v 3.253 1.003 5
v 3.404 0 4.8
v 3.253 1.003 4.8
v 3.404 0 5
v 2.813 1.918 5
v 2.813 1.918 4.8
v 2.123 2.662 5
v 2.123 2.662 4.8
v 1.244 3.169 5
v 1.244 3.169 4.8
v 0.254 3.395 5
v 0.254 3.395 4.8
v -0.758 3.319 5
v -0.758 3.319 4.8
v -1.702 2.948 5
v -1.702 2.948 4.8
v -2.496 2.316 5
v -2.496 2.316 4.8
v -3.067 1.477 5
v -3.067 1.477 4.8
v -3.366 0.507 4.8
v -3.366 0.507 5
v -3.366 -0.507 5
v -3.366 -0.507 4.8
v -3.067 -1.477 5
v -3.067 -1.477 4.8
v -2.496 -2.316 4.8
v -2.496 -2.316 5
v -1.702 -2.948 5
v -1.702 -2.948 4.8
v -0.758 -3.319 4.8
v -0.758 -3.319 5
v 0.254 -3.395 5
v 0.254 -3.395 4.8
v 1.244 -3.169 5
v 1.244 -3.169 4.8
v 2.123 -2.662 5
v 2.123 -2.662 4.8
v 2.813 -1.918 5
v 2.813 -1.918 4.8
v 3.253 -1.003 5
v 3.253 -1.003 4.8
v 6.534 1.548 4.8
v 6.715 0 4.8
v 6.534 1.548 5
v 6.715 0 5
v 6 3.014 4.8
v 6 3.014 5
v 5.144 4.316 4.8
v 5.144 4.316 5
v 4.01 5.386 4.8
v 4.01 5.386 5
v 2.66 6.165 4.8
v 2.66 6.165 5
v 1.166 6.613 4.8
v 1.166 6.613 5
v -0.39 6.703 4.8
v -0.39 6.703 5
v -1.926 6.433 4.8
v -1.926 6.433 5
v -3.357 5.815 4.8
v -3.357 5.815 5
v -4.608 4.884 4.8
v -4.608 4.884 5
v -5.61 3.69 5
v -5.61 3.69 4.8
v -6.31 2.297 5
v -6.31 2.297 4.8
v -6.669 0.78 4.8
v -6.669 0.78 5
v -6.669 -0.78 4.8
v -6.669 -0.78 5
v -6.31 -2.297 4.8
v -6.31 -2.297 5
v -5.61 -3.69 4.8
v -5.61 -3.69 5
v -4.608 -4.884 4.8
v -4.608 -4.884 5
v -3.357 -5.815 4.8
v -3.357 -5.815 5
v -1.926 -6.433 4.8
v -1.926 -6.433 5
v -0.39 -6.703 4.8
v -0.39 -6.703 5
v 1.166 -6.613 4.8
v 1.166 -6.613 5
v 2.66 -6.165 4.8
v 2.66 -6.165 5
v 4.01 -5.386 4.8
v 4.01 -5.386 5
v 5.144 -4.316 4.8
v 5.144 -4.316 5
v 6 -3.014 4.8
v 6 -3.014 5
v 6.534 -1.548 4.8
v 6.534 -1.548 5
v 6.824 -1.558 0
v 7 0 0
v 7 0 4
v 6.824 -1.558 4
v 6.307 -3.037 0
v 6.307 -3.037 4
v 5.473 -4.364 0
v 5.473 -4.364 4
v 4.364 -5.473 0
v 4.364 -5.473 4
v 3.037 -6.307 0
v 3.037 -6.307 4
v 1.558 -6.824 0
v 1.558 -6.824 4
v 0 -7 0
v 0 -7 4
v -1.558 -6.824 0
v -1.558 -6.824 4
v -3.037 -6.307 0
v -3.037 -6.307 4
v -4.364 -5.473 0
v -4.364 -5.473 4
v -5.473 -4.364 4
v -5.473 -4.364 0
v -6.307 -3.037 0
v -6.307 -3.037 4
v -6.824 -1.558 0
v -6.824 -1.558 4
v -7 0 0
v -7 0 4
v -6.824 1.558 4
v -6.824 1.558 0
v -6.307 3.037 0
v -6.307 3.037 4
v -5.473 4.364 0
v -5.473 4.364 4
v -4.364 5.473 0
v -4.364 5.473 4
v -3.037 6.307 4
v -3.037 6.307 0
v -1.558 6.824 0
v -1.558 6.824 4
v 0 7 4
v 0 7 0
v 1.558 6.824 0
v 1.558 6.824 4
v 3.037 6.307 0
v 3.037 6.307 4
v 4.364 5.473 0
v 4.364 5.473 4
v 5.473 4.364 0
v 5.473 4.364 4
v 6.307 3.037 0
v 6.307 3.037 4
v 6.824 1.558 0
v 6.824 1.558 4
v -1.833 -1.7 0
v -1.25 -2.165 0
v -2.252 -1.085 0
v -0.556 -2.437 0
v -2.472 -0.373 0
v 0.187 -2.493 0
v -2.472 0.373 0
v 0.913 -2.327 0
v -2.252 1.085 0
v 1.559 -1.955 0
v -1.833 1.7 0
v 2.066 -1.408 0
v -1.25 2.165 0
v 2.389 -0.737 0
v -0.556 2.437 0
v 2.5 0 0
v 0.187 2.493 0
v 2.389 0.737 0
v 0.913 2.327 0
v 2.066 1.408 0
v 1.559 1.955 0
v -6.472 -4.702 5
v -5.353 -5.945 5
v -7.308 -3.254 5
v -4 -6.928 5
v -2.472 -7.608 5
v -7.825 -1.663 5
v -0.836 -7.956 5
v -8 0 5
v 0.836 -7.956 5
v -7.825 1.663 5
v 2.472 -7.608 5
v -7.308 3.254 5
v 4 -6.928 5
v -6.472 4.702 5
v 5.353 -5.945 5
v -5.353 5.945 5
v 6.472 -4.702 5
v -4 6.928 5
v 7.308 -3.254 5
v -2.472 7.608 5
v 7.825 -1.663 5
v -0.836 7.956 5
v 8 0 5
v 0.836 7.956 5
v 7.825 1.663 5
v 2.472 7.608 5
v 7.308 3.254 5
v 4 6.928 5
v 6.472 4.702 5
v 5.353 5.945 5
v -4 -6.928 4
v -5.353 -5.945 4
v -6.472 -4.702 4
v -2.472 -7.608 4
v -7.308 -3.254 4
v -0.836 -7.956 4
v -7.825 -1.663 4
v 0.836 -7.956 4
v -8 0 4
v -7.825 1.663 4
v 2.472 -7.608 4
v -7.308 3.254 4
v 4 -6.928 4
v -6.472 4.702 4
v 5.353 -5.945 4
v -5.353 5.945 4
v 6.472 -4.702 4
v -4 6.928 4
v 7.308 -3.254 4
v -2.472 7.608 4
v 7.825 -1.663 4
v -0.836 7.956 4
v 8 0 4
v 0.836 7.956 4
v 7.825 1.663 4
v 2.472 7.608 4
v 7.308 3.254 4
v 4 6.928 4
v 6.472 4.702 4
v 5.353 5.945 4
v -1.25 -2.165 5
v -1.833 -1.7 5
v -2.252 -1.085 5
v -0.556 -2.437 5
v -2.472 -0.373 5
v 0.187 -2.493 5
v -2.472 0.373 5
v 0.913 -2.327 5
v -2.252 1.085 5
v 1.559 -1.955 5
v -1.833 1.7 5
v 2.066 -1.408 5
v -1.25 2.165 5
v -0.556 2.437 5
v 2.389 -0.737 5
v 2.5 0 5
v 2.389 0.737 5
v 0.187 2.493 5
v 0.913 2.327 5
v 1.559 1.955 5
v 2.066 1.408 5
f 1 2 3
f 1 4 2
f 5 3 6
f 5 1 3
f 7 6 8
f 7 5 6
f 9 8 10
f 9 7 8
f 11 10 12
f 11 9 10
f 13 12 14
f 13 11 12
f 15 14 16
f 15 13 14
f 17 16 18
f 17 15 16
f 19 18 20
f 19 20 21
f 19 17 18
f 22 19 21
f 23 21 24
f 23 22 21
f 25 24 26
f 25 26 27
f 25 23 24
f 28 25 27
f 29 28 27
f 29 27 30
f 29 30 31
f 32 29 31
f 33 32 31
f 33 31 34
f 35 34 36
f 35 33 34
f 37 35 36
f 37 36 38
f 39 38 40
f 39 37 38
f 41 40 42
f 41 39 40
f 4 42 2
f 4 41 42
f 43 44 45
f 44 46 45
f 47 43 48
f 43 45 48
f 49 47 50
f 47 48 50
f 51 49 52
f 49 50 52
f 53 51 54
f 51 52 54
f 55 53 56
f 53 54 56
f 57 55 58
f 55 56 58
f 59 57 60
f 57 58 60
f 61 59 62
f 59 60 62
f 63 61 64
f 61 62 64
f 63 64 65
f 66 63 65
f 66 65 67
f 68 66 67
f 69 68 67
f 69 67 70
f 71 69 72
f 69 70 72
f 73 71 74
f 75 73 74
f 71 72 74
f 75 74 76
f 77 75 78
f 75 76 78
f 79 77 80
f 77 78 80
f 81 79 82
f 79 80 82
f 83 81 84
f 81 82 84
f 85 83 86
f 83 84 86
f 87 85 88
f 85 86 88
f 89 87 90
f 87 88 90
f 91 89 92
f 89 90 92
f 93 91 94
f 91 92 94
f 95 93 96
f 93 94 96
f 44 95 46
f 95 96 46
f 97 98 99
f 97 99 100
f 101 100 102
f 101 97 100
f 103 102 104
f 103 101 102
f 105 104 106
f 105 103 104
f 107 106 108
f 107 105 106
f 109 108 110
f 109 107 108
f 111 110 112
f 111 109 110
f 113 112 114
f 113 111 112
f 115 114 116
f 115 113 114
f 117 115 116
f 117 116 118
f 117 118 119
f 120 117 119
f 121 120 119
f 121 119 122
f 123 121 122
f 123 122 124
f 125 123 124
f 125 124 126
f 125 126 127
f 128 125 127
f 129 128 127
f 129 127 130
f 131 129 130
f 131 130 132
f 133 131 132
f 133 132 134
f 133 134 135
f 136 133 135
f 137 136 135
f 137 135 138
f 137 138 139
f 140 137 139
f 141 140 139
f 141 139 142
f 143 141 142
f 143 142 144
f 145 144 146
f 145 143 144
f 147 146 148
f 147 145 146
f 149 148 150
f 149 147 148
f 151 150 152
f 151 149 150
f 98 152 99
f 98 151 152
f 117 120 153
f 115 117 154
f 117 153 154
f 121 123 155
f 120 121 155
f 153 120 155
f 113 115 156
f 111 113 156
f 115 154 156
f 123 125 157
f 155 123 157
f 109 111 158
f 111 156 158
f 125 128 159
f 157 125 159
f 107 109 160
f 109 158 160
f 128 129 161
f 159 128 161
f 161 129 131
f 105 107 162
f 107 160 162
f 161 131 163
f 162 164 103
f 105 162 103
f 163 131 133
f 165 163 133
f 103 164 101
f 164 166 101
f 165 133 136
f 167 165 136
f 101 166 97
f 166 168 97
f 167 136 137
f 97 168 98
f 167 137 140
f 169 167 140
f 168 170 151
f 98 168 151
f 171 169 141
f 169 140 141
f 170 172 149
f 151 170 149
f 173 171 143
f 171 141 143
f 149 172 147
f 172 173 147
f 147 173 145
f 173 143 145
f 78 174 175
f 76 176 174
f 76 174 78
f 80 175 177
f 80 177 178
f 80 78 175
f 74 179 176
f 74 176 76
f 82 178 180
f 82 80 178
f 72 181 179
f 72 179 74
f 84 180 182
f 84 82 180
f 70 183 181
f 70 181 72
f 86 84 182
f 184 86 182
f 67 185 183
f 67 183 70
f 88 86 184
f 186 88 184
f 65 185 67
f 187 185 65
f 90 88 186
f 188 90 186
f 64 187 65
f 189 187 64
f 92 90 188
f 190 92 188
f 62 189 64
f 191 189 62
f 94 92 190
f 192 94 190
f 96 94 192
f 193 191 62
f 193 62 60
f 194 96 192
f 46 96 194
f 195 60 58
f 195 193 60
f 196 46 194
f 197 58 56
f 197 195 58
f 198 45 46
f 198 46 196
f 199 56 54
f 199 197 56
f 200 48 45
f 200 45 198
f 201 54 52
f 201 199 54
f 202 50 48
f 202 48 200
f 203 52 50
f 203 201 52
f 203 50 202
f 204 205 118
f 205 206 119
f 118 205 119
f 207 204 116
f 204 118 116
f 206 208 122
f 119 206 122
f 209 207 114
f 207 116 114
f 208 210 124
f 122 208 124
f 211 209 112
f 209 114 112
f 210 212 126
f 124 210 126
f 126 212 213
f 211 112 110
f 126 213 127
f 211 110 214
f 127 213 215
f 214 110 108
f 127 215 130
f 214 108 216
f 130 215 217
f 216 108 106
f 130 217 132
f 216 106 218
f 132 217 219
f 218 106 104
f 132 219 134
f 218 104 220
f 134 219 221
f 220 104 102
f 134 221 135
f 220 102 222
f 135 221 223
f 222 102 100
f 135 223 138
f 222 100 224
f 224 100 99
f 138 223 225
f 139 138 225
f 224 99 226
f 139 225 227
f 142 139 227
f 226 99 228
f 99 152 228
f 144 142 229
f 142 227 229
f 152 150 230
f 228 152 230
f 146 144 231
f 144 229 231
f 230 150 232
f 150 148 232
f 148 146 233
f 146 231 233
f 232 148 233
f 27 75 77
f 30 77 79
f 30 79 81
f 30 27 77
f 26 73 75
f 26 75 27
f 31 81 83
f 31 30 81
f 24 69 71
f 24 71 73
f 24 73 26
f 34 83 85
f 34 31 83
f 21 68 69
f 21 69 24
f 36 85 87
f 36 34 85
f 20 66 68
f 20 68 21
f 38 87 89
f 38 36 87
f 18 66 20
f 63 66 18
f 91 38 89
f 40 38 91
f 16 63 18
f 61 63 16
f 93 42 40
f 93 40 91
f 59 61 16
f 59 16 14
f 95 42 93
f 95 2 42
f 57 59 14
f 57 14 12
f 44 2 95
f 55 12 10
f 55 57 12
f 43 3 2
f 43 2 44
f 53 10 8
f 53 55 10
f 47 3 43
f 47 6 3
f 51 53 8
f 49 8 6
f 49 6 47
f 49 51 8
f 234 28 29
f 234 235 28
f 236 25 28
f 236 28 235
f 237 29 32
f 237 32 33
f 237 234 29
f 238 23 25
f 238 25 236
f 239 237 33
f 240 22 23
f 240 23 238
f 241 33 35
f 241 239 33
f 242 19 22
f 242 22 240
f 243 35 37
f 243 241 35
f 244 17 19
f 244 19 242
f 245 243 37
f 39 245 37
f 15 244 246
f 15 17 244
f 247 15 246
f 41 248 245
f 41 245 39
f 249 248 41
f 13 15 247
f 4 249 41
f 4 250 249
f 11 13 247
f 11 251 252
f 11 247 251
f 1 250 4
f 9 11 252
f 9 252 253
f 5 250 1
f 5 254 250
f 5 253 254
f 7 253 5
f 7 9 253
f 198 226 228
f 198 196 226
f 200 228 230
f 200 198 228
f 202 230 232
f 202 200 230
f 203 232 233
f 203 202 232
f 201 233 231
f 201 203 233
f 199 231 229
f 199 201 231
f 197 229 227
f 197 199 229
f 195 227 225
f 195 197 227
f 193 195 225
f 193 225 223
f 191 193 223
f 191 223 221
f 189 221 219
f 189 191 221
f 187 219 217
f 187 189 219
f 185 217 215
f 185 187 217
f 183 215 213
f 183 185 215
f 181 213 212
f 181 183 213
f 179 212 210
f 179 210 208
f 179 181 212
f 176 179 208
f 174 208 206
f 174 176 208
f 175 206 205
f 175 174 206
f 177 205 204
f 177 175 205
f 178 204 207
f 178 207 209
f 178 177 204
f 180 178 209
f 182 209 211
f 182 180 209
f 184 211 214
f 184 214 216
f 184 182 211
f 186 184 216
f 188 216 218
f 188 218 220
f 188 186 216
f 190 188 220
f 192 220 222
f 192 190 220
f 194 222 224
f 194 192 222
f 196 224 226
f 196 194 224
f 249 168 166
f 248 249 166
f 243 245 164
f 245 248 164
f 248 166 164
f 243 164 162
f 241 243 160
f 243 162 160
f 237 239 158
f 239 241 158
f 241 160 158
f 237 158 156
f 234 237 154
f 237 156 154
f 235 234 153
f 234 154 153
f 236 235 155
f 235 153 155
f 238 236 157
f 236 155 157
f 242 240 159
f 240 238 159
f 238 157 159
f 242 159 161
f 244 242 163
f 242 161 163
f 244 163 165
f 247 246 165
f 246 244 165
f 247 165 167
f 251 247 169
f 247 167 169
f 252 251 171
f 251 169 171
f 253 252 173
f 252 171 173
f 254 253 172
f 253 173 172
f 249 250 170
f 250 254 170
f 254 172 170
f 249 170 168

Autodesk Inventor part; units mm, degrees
ref_plane "YZ Plane" through (0, 0, 0) normal (1, 0, 0) x (0, 1, 0)
ref_plane "XZ Plane" through (0, 0, 0) normal (0, 1, 0) x (-1, 0, 0)
ref_plane "XY Plane" through (0, 0, 0) normal (0, 0, 1) x (1, 0, 0)
sketch "Sketch1" plane through (0, 0, 0) normal (0, 0, 1) x (1, 0, 0)
  circle A0 centre (0, 0) radius 5.0674 projected
  circle A1 centre (0, 0) radius 2.5
  circle A2 centre (0, 0) radius 7
  point P0 (0, 0)
  dimension "d0" = 5
  dimension "d1" = 14
extrude "Extrusion1" add sketch "Sketch1" along normal blind 5 contours A0 | A2
sketch "Sketch2" plane through (0, 0, 5) normal (0, 0, 1) x (1, 0, 0)
  circle A0 centre (0, 0) radius 2.5931
  circle A1 centre (0, 0) radius 2.5 projected
  circle A2 centre (0, 0) radius 8
  dimension "d4" = 16
extrude "Extrusion2" add sketch "Sketch2" against normal blind 1 contours A2
sketch "Sketch3" plane through (0, 0, 5) normal (0, 0, 1) x (1, 0, 0)
  circle A0 centre (0, 0) radius 2.5 projected
  circle A1 centre (0, 0) radius 2.5 projected
  circle A2 centre (0, 0) radius 3.4045
  circle A3 centre (0, 0) radius 6.7146
  point P0 (0, 0)
extrude "Extrusion3" cut sketch "Sketch3" against normal blind 0.2 contours A3
properties part number "Flanged Bearing_CPY"
